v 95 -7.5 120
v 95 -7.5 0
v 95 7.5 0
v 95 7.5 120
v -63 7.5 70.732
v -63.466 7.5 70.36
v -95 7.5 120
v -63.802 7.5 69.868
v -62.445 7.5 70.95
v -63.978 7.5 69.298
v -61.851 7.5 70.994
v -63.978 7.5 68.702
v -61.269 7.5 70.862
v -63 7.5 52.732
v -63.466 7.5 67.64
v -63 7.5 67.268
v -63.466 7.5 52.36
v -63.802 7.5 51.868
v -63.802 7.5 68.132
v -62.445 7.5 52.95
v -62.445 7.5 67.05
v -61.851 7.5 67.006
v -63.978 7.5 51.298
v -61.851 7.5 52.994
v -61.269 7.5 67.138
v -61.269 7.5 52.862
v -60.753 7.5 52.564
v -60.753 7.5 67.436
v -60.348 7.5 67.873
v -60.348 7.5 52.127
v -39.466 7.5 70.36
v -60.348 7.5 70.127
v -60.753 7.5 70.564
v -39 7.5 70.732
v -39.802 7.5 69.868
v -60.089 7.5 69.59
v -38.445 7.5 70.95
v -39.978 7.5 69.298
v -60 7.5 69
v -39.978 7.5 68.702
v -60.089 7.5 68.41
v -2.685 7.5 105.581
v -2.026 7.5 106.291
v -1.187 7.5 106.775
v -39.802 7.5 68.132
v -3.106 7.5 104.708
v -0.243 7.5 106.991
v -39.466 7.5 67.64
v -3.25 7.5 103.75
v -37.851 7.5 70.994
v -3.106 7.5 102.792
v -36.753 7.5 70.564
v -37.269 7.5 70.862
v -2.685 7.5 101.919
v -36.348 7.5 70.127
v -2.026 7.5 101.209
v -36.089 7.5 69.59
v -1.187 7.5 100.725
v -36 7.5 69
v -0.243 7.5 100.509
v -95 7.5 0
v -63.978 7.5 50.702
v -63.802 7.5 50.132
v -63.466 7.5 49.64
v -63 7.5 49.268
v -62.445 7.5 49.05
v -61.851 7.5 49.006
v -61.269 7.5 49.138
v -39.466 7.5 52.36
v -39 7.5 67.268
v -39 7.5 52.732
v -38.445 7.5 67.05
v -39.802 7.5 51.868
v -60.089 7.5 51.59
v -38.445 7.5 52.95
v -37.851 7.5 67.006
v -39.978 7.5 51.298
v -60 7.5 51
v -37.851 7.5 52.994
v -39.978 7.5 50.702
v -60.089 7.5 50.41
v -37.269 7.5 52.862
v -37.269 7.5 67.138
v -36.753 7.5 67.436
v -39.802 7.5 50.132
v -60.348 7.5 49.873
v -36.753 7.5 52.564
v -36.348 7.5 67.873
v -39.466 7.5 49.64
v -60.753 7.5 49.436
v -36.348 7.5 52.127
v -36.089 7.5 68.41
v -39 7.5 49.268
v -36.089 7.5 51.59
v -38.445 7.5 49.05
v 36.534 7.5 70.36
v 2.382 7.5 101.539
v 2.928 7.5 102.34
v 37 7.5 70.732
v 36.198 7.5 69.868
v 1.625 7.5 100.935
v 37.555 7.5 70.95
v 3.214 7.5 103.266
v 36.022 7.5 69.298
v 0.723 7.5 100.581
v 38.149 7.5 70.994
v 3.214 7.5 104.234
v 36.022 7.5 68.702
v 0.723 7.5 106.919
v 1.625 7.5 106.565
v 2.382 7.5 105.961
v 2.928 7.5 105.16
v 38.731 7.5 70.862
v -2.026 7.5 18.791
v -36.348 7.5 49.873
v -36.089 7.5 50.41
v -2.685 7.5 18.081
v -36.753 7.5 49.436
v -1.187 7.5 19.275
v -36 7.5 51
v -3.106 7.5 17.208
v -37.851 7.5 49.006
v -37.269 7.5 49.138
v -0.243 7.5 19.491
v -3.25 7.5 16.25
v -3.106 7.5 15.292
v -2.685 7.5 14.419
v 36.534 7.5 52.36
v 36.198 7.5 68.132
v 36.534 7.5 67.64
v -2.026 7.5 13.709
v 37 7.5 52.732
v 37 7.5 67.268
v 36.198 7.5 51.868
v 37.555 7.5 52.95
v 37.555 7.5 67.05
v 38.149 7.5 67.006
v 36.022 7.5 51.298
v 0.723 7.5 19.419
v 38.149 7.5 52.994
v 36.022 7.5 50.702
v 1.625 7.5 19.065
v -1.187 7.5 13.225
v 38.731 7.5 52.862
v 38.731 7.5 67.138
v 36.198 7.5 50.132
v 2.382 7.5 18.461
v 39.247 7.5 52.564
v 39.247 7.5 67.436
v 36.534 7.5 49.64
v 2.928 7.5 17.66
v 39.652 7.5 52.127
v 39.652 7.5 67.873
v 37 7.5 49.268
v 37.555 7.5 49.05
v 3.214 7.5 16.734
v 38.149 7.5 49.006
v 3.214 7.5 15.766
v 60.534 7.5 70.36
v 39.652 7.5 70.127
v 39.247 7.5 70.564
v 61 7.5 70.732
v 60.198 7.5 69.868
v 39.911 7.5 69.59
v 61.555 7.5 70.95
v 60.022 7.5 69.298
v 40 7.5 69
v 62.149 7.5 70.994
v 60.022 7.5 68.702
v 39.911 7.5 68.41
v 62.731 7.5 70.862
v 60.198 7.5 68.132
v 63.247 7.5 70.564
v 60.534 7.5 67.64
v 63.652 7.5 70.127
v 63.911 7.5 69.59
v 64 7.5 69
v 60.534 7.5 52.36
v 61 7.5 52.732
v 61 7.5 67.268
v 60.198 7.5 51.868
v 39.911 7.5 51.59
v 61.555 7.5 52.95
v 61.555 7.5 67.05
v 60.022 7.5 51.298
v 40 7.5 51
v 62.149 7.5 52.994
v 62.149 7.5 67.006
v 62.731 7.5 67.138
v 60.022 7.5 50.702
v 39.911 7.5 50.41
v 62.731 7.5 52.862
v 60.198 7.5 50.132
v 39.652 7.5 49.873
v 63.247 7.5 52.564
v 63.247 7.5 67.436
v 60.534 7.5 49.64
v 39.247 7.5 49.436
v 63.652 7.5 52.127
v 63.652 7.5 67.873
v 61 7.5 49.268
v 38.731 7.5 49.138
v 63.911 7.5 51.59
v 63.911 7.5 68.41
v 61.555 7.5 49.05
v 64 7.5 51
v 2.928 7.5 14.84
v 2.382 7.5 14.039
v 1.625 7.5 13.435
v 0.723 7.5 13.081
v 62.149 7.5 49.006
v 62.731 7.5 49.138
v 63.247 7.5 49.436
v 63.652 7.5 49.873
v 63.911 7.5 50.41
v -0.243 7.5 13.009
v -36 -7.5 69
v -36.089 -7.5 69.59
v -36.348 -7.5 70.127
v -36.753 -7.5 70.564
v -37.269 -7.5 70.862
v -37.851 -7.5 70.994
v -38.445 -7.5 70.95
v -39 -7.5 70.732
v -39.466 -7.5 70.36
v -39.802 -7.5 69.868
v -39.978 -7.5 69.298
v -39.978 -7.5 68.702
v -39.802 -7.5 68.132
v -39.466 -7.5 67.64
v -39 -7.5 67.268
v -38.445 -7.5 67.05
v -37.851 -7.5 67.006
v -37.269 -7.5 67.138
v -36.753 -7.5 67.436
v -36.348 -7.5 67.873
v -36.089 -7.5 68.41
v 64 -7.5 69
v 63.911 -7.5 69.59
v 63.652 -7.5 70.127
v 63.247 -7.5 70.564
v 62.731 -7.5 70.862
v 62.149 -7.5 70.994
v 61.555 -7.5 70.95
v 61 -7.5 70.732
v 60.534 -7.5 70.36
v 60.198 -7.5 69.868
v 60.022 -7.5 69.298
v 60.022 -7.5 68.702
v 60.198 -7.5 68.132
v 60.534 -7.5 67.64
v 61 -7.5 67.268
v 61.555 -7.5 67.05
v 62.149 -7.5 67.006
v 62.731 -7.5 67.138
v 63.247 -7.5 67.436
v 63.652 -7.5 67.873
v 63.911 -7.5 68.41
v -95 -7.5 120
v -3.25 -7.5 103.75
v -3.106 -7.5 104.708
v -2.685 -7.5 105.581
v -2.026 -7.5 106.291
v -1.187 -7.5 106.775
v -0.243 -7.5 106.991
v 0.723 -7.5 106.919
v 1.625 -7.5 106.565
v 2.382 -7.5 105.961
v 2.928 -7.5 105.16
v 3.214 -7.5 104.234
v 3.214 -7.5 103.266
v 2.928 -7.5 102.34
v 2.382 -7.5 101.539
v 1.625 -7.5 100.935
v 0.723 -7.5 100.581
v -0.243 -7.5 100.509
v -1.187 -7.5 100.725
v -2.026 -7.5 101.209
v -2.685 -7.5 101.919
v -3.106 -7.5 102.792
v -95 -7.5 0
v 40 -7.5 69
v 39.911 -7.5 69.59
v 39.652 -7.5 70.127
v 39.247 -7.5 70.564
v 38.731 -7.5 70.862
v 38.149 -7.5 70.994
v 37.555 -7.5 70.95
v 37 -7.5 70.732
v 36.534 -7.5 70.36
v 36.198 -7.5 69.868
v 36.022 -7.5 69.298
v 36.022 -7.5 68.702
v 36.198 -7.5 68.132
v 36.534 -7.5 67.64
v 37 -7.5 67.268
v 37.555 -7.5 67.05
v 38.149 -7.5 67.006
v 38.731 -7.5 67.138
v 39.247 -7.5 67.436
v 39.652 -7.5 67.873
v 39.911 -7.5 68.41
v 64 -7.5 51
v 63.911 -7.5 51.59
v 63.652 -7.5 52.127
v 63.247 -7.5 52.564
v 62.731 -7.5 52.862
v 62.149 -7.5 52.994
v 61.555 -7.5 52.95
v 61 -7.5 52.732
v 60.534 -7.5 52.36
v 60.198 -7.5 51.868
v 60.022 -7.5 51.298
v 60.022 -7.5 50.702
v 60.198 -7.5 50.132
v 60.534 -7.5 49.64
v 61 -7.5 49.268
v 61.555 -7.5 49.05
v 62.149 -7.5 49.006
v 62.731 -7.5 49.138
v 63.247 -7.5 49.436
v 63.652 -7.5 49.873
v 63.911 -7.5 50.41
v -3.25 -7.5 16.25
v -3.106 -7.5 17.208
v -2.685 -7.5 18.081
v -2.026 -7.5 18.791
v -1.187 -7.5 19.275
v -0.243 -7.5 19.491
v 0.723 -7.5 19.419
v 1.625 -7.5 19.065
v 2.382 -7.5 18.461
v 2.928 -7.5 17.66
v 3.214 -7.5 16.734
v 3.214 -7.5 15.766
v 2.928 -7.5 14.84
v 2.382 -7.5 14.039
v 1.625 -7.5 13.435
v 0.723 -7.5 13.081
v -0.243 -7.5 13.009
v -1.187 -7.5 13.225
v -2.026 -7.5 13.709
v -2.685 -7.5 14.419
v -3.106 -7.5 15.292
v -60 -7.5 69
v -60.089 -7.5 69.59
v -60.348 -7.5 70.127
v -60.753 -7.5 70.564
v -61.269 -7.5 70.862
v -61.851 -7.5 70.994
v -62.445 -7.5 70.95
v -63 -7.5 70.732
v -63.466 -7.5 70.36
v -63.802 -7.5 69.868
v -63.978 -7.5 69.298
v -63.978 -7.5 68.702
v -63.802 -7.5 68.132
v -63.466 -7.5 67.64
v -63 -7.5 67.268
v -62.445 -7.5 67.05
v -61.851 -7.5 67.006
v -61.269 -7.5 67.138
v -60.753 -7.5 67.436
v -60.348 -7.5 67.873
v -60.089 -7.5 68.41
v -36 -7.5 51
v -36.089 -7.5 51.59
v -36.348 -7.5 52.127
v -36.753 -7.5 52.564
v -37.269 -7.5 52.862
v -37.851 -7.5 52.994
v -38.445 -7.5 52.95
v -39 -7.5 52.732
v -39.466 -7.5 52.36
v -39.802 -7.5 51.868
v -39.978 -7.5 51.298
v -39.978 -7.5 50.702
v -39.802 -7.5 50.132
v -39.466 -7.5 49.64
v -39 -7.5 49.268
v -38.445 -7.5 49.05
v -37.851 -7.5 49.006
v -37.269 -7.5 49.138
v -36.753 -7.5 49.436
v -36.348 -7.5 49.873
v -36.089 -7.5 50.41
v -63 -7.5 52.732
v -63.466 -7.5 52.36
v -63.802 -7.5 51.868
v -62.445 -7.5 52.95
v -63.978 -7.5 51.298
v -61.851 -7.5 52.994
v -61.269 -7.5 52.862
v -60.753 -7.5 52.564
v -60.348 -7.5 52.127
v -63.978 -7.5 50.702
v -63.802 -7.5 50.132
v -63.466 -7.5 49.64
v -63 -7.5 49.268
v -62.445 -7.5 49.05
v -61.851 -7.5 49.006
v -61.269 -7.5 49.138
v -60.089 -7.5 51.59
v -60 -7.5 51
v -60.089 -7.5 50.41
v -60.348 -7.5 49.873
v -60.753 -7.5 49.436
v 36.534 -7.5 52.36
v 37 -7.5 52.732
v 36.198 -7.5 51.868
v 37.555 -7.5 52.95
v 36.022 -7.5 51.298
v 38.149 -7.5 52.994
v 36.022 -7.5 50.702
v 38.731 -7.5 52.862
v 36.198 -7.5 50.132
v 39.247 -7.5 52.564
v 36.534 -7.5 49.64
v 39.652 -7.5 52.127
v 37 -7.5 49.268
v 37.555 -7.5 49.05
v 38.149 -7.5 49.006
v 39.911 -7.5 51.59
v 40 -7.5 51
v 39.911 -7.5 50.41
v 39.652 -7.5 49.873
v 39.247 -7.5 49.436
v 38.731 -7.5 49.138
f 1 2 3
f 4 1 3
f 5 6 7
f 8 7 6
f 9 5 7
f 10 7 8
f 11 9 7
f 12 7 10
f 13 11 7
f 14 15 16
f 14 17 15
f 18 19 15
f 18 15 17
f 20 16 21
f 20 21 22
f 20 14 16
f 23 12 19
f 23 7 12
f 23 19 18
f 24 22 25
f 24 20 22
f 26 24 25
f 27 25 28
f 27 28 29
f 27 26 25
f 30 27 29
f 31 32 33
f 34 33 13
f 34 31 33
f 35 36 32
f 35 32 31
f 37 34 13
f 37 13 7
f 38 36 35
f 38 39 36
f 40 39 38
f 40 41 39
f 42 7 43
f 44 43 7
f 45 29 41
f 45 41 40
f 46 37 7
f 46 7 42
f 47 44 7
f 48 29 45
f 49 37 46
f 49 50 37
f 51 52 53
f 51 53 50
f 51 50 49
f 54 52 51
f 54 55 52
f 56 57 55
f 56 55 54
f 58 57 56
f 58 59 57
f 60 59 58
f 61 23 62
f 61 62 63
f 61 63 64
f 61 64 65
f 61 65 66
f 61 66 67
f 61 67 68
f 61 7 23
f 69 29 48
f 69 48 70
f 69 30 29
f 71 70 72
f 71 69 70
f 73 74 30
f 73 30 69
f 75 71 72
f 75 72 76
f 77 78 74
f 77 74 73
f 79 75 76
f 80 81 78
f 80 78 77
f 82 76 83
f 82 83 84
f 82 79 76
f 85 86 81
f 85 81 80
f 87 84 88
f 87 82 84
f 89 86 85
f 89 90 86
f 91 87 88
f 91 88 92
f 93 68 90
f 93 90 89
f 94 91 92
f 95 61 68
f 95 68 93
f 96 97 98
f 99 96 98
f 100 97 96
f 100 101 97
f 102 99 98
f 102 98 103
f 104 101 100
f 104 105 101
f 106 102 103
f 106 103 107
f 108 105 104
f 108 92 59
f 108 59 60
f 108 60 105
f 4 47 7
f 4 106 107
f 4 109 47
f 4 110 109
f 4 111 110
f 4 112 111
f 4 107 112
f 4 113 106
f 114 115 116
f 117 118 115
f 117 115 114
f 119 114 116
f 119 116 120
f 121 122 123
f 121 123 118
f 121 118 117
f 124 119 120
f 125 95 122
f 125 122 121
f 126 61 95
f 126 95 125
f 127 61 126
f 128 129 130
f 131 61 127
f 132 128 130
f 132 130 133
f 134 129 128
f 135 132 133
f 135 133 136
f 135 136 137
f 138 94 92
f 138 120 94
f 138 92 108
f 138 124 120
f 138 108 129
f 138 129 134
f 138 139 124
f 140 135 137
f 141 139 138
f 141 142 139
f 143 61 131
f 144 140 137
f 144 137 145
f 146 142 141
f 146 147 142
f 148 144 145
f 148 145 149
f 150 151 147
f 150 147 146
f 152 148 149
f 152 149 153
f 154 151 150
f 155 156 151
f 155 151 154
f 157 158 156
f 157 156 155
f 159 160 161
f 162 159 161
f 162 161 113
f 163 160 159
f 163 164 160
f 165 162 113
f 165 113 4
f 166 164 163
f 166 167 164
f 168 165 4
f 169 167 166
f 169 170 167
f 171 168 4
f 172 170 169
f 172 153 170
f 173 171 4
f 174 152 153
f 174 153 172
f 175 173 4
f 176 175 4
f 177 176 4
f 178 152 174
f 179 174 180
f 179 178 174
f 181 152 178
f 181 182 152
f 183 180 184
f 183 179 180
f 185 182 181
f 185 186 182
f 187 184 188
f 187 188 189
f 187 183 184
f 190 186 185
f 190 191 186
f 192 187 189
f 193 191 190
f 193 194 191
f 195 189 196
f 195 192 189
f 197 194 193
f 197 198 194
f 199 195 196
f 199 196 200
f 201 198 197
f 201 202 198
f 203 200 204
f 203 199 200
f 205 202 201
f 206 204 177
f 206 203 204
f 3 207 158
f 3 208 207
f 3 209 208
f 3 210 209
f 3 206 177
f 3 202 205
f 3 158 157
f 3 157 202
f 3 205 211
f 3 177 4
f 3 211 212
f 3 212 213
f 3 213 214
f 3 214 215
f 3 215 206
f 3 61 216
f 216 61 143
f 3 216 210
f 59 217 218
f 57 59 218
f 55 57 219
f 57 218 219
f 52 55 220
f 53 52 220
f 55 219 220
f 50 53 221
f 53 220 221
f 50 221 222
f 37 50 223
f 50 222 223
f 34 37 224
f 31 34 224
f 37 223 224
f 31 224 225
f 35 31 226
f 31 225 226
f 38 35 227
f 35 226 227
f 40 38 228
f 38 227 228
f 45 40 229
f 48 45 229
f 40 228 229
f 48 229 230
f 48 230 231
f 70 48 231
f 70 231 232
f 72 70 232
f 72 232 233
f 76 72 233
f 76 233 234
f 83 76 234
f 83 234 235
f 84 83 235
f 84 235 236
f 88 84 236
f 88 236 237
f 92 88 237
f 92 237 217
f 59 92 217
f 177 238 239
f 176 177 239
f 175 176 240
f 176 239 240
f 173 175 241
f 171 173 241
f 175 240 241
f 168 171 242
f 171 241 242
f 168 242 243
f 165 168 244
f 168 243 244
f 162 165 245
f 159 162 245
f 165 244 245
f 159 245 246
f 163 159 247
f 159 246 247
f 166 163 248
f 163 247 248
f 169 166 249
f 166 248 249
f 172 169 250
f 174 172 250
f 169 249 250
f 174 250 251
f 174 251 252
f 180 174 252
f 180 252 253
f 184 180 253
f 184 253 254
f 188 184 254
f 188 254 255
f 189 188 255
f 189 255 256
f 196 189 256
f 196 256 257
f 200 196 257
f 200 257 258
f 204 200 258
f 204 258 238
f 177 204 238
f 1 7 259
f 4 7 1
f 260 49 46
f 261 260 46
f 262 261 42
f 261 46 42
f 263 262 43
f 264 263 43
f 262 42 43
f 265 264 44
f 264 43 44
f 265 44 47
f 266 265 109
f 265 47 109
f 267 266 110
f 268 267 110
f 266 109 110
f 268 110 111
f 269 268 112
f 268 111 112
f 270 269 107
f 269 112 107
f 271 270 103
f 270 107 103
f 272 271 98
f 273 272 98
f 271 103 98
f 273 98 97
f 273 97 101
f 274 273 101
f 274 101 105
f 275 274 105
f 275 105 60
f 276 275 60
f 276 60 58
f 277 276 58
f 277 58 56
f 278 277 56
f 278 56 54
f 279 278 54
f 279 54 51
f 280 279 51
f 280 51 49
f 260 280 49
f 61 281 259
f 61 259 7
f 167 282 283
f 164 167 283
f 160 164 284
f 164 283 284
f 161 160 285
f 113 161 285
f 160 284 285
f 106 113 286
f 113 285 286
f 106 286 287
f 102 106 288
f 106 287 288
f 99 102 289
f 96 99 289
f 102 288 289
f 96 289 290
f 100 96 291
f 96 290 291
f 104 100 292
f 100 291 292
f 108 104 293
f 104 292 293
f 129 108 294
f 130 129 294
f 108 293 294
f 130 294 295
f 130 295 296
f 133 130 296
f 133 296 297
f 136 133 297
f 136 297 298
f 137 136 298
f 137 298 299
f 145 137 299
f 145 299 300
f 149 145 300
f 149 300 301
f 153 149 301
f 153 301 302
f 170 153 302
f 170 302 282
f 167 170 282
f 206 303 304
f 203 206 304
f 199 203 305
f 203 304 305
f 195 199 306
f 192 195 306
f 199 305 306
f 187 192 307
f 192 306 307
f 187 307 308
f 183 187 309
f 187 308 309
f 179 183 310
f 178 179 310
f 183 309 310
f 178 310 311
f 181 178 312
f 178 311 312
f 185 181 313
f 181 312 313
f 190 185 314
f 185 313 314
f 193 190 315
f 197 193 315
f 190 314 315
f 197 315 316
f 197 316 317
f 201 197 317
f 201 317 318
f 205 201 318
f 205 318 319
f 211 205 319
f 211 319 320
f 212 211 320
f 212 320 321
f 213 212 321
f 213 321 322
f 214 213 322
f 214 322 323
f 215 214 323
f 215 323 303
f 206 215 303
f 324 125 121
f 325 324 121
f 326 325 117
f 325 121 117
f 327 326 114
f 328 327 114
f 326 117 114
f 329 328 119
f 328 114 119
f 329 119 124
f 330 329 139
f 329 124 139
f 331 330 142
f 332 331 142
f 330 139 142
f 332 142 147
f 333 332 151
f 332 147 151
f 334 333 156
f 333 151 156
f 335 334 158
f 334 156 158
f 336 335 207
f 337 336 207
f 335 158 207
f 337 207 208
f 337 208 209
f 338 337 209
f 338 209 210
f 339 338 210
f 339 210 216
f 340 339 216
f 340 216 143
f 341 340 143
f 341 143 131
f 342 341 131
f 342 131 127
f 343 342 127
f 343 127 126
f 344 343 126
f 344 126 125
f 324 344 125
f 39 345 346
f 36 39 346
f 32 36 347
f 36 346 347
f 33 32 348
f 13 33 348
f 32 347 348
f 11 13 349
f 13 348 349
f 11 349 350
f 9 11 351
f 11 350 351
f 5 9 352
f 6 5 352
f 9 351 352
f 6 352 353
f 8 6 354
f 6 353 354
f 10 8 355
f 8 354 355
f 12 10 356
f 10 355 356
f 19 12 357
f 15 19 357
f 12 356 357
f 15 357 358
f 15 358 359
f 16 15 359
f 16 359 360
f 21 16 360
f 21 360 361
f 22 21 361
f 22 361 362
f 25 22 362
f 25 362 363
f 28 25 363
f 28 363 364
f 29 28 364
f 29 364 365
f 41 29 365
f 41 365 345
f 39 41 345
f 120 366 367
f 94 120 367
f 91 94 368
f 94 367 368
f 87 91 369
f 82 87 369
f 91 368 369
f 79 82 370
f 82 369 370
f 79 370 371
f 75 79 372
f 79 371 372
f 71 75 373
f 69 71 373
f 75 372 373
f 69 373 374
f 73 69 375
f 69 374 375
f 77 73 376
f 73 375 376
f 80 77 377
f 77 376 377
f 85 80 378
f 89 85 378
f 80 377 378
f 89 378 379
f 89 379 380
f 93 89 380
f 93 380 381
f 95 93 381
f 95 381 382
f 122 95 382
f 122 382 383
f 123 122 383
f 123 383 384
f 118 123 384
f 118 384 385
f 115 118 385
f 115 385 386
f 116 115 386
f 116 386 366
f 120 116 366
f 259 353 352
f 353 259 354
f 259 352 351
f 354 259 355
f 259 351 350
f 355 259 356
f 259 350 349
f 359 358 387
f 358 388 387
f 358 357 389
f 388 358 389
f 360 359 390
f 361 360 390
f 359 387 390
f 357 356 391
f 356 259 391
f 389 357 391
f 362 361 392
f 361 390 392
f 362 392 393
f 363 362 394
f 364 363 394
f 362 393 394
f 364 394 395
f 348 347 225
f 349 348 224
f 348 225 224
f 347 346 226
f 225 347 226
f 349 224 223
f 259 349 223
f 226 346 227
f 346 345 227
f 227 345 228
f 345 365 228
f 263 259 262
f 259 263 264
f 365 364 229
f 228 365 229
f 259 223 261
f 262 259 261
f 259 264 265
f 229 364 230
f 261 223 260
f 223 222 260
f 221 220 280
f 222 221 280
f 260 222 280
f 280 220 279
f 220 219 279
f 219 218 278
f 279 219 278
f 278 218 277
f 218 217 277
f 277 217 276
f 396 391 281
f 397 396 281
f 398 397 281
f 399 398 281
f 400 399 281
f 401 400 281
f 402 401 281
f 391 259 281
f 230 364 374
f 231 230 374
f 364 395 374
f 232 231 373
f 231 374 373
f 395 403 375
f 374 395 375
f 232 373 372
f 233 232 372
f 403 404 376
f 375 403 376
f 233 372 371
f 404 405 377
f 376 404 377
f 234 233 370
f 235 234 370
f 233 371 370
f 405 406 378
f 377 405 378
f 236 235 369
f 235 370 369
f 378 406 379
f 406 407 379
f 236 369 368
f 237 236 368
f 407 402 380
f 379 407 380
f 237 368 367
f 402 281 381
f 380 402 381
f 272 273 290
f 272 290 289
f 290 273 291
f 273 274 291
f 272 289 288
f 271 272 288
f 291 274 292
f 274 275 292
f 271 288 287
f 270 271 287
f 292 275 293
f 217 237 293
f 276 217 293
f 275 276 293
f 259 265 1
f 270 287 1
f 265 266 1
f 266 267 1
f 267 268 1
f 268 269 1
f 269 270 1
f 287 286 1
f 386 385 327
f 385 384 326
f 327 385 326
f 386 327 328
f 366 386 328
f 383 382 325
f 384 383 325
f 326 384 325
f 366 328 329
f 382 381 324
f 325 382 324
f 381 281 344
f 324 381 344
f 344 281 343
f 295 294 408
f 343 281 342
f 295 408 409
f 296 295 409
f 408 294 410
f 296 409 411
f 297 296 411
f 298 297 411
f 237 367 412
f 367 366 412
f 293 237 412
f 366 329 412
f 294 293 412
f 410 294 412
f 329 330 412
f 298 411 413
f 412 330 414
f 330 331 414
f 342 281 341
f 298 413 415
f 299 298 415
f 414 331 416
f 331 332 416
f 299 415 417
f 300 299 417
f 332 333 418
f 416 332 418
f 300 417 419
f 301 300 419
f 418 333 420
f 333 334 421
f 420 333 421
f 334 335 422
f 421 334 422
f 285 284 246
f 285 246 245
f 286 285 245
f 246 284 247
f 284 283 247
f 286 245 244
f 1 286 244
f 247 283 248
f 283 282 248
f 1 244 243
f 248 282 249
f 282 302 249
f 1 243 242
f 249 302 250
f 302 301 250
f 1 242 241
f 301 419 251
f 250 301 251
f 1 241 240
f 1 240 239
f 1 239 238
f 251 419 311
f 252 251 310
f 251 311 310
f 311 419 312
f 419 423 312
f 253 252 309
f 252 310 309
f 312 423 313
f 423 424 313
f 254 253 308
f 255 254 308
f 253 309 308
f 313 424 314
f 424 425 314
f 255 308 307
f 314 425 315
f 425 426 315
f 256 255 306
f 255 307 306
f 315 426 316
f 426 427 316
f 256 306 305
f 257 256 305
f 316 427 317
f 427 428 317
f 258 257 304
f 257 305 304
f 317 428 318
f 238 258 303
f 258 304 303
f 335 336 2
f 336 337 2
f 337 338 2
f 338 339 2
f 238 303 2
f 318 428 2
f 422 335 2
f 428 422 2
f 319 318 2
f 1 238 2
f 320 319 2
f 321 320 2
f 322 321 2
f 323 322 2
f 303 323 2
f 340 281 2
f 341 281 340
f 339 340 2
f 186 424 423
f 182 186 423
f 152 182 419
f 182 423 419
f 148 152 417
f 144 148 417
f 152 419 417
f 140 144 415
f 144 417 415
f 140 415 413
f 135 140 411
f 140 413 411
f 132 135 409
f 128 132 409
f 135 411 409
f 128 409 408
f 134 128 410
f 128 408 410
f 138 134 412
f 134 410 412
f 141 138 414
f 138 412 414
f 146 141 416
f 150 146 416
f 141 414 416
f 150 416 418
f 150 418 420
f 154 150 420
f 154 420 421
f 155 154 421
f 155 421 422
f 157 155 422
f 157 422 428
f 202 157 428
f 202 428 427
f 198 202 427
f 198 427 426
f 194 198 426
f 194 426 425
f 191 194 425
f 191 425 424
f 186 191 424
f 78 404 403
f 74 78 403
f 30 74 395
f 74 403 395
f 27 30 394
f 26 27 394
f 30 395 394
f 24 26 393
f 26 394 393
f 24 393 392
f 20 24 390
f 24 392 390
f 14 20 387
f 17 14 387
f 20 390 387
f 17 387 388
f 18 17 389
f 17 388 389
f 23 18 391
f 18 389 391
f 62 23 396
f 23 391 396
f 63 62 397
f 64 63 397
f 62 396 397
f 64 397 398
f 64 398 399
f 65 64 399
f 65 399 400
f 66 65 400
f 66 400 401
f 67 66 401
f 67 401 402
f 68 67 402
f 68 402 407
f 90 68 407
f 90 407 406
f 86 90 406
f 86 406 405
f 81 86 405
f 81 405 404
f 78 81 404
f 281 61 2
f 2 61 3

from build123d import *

# Parameters (mm, degrees)
F0_W     = 190
F0_H     = 15
F1_DEPTH = 120
F2_R     = 2
F2_R_2   = 0.903802
F2_R_3   = 1.110636
F2_R_4   = 1.007085
F3_DEPTH = 15.001
F4_R     = 3.25
F5_DEPTH = 15.001


with BuildPart() as f1:
    # F0 (on Top) → F1 (new body)
    with BuildSketch(Plane.XY):
        Rectangle(F0_W, F0_H)
    extrude(amount=F1_DEPTH)

    # F2 (on face) → F3 (cut, through all)
    with BuildSketch(Plane.XZ.offset(7.5)):
        with Locations((-62, 69)):
            Circle(F2_R)
        with Locations((-161.054239, -20.151298)):
            Circle(F2_R_2)
        with Locations((-164.950773, -26.284985)):
            Circle(F2_R_3)
        with Locations((-381.1506, -111.366101)):
            Circle(F2_R_4)
        with Locations((-38, 69)):
            Circle(F2_R)
        with Locations((-62, 51)):
            Circle(F2_R)
        with Locations((-38, 51)):
            Circle(F2_R)
        with Locations((38, 51)):
            Circle(F2_R)
        with Locations((62, 51)):
            Circle(F2_R)
        with Locations((38, 69)):
            Circle(F2_R)
        with Locations((62, 69)):
            Circle(F2_R)
    extrude(amount=-F3_DEPTH, mode=Mode.SUBTRACT)

    # F4 (on face) → F5 (cut, through all)
    with BuildSketch(Plane(origin=(0, 7.5, 0), x_dir=(-1, 0, 0), z_dir=(0, 1, 0))):
        with Locations((0, 103.75)):
            Circle(F4_R)
        with Locations((0, 16.25)):
            Circle(F4_R)
    extrude(amount=-F5_DEPTH, mode=Mode.SUBTRACT)


solid = f1.part
